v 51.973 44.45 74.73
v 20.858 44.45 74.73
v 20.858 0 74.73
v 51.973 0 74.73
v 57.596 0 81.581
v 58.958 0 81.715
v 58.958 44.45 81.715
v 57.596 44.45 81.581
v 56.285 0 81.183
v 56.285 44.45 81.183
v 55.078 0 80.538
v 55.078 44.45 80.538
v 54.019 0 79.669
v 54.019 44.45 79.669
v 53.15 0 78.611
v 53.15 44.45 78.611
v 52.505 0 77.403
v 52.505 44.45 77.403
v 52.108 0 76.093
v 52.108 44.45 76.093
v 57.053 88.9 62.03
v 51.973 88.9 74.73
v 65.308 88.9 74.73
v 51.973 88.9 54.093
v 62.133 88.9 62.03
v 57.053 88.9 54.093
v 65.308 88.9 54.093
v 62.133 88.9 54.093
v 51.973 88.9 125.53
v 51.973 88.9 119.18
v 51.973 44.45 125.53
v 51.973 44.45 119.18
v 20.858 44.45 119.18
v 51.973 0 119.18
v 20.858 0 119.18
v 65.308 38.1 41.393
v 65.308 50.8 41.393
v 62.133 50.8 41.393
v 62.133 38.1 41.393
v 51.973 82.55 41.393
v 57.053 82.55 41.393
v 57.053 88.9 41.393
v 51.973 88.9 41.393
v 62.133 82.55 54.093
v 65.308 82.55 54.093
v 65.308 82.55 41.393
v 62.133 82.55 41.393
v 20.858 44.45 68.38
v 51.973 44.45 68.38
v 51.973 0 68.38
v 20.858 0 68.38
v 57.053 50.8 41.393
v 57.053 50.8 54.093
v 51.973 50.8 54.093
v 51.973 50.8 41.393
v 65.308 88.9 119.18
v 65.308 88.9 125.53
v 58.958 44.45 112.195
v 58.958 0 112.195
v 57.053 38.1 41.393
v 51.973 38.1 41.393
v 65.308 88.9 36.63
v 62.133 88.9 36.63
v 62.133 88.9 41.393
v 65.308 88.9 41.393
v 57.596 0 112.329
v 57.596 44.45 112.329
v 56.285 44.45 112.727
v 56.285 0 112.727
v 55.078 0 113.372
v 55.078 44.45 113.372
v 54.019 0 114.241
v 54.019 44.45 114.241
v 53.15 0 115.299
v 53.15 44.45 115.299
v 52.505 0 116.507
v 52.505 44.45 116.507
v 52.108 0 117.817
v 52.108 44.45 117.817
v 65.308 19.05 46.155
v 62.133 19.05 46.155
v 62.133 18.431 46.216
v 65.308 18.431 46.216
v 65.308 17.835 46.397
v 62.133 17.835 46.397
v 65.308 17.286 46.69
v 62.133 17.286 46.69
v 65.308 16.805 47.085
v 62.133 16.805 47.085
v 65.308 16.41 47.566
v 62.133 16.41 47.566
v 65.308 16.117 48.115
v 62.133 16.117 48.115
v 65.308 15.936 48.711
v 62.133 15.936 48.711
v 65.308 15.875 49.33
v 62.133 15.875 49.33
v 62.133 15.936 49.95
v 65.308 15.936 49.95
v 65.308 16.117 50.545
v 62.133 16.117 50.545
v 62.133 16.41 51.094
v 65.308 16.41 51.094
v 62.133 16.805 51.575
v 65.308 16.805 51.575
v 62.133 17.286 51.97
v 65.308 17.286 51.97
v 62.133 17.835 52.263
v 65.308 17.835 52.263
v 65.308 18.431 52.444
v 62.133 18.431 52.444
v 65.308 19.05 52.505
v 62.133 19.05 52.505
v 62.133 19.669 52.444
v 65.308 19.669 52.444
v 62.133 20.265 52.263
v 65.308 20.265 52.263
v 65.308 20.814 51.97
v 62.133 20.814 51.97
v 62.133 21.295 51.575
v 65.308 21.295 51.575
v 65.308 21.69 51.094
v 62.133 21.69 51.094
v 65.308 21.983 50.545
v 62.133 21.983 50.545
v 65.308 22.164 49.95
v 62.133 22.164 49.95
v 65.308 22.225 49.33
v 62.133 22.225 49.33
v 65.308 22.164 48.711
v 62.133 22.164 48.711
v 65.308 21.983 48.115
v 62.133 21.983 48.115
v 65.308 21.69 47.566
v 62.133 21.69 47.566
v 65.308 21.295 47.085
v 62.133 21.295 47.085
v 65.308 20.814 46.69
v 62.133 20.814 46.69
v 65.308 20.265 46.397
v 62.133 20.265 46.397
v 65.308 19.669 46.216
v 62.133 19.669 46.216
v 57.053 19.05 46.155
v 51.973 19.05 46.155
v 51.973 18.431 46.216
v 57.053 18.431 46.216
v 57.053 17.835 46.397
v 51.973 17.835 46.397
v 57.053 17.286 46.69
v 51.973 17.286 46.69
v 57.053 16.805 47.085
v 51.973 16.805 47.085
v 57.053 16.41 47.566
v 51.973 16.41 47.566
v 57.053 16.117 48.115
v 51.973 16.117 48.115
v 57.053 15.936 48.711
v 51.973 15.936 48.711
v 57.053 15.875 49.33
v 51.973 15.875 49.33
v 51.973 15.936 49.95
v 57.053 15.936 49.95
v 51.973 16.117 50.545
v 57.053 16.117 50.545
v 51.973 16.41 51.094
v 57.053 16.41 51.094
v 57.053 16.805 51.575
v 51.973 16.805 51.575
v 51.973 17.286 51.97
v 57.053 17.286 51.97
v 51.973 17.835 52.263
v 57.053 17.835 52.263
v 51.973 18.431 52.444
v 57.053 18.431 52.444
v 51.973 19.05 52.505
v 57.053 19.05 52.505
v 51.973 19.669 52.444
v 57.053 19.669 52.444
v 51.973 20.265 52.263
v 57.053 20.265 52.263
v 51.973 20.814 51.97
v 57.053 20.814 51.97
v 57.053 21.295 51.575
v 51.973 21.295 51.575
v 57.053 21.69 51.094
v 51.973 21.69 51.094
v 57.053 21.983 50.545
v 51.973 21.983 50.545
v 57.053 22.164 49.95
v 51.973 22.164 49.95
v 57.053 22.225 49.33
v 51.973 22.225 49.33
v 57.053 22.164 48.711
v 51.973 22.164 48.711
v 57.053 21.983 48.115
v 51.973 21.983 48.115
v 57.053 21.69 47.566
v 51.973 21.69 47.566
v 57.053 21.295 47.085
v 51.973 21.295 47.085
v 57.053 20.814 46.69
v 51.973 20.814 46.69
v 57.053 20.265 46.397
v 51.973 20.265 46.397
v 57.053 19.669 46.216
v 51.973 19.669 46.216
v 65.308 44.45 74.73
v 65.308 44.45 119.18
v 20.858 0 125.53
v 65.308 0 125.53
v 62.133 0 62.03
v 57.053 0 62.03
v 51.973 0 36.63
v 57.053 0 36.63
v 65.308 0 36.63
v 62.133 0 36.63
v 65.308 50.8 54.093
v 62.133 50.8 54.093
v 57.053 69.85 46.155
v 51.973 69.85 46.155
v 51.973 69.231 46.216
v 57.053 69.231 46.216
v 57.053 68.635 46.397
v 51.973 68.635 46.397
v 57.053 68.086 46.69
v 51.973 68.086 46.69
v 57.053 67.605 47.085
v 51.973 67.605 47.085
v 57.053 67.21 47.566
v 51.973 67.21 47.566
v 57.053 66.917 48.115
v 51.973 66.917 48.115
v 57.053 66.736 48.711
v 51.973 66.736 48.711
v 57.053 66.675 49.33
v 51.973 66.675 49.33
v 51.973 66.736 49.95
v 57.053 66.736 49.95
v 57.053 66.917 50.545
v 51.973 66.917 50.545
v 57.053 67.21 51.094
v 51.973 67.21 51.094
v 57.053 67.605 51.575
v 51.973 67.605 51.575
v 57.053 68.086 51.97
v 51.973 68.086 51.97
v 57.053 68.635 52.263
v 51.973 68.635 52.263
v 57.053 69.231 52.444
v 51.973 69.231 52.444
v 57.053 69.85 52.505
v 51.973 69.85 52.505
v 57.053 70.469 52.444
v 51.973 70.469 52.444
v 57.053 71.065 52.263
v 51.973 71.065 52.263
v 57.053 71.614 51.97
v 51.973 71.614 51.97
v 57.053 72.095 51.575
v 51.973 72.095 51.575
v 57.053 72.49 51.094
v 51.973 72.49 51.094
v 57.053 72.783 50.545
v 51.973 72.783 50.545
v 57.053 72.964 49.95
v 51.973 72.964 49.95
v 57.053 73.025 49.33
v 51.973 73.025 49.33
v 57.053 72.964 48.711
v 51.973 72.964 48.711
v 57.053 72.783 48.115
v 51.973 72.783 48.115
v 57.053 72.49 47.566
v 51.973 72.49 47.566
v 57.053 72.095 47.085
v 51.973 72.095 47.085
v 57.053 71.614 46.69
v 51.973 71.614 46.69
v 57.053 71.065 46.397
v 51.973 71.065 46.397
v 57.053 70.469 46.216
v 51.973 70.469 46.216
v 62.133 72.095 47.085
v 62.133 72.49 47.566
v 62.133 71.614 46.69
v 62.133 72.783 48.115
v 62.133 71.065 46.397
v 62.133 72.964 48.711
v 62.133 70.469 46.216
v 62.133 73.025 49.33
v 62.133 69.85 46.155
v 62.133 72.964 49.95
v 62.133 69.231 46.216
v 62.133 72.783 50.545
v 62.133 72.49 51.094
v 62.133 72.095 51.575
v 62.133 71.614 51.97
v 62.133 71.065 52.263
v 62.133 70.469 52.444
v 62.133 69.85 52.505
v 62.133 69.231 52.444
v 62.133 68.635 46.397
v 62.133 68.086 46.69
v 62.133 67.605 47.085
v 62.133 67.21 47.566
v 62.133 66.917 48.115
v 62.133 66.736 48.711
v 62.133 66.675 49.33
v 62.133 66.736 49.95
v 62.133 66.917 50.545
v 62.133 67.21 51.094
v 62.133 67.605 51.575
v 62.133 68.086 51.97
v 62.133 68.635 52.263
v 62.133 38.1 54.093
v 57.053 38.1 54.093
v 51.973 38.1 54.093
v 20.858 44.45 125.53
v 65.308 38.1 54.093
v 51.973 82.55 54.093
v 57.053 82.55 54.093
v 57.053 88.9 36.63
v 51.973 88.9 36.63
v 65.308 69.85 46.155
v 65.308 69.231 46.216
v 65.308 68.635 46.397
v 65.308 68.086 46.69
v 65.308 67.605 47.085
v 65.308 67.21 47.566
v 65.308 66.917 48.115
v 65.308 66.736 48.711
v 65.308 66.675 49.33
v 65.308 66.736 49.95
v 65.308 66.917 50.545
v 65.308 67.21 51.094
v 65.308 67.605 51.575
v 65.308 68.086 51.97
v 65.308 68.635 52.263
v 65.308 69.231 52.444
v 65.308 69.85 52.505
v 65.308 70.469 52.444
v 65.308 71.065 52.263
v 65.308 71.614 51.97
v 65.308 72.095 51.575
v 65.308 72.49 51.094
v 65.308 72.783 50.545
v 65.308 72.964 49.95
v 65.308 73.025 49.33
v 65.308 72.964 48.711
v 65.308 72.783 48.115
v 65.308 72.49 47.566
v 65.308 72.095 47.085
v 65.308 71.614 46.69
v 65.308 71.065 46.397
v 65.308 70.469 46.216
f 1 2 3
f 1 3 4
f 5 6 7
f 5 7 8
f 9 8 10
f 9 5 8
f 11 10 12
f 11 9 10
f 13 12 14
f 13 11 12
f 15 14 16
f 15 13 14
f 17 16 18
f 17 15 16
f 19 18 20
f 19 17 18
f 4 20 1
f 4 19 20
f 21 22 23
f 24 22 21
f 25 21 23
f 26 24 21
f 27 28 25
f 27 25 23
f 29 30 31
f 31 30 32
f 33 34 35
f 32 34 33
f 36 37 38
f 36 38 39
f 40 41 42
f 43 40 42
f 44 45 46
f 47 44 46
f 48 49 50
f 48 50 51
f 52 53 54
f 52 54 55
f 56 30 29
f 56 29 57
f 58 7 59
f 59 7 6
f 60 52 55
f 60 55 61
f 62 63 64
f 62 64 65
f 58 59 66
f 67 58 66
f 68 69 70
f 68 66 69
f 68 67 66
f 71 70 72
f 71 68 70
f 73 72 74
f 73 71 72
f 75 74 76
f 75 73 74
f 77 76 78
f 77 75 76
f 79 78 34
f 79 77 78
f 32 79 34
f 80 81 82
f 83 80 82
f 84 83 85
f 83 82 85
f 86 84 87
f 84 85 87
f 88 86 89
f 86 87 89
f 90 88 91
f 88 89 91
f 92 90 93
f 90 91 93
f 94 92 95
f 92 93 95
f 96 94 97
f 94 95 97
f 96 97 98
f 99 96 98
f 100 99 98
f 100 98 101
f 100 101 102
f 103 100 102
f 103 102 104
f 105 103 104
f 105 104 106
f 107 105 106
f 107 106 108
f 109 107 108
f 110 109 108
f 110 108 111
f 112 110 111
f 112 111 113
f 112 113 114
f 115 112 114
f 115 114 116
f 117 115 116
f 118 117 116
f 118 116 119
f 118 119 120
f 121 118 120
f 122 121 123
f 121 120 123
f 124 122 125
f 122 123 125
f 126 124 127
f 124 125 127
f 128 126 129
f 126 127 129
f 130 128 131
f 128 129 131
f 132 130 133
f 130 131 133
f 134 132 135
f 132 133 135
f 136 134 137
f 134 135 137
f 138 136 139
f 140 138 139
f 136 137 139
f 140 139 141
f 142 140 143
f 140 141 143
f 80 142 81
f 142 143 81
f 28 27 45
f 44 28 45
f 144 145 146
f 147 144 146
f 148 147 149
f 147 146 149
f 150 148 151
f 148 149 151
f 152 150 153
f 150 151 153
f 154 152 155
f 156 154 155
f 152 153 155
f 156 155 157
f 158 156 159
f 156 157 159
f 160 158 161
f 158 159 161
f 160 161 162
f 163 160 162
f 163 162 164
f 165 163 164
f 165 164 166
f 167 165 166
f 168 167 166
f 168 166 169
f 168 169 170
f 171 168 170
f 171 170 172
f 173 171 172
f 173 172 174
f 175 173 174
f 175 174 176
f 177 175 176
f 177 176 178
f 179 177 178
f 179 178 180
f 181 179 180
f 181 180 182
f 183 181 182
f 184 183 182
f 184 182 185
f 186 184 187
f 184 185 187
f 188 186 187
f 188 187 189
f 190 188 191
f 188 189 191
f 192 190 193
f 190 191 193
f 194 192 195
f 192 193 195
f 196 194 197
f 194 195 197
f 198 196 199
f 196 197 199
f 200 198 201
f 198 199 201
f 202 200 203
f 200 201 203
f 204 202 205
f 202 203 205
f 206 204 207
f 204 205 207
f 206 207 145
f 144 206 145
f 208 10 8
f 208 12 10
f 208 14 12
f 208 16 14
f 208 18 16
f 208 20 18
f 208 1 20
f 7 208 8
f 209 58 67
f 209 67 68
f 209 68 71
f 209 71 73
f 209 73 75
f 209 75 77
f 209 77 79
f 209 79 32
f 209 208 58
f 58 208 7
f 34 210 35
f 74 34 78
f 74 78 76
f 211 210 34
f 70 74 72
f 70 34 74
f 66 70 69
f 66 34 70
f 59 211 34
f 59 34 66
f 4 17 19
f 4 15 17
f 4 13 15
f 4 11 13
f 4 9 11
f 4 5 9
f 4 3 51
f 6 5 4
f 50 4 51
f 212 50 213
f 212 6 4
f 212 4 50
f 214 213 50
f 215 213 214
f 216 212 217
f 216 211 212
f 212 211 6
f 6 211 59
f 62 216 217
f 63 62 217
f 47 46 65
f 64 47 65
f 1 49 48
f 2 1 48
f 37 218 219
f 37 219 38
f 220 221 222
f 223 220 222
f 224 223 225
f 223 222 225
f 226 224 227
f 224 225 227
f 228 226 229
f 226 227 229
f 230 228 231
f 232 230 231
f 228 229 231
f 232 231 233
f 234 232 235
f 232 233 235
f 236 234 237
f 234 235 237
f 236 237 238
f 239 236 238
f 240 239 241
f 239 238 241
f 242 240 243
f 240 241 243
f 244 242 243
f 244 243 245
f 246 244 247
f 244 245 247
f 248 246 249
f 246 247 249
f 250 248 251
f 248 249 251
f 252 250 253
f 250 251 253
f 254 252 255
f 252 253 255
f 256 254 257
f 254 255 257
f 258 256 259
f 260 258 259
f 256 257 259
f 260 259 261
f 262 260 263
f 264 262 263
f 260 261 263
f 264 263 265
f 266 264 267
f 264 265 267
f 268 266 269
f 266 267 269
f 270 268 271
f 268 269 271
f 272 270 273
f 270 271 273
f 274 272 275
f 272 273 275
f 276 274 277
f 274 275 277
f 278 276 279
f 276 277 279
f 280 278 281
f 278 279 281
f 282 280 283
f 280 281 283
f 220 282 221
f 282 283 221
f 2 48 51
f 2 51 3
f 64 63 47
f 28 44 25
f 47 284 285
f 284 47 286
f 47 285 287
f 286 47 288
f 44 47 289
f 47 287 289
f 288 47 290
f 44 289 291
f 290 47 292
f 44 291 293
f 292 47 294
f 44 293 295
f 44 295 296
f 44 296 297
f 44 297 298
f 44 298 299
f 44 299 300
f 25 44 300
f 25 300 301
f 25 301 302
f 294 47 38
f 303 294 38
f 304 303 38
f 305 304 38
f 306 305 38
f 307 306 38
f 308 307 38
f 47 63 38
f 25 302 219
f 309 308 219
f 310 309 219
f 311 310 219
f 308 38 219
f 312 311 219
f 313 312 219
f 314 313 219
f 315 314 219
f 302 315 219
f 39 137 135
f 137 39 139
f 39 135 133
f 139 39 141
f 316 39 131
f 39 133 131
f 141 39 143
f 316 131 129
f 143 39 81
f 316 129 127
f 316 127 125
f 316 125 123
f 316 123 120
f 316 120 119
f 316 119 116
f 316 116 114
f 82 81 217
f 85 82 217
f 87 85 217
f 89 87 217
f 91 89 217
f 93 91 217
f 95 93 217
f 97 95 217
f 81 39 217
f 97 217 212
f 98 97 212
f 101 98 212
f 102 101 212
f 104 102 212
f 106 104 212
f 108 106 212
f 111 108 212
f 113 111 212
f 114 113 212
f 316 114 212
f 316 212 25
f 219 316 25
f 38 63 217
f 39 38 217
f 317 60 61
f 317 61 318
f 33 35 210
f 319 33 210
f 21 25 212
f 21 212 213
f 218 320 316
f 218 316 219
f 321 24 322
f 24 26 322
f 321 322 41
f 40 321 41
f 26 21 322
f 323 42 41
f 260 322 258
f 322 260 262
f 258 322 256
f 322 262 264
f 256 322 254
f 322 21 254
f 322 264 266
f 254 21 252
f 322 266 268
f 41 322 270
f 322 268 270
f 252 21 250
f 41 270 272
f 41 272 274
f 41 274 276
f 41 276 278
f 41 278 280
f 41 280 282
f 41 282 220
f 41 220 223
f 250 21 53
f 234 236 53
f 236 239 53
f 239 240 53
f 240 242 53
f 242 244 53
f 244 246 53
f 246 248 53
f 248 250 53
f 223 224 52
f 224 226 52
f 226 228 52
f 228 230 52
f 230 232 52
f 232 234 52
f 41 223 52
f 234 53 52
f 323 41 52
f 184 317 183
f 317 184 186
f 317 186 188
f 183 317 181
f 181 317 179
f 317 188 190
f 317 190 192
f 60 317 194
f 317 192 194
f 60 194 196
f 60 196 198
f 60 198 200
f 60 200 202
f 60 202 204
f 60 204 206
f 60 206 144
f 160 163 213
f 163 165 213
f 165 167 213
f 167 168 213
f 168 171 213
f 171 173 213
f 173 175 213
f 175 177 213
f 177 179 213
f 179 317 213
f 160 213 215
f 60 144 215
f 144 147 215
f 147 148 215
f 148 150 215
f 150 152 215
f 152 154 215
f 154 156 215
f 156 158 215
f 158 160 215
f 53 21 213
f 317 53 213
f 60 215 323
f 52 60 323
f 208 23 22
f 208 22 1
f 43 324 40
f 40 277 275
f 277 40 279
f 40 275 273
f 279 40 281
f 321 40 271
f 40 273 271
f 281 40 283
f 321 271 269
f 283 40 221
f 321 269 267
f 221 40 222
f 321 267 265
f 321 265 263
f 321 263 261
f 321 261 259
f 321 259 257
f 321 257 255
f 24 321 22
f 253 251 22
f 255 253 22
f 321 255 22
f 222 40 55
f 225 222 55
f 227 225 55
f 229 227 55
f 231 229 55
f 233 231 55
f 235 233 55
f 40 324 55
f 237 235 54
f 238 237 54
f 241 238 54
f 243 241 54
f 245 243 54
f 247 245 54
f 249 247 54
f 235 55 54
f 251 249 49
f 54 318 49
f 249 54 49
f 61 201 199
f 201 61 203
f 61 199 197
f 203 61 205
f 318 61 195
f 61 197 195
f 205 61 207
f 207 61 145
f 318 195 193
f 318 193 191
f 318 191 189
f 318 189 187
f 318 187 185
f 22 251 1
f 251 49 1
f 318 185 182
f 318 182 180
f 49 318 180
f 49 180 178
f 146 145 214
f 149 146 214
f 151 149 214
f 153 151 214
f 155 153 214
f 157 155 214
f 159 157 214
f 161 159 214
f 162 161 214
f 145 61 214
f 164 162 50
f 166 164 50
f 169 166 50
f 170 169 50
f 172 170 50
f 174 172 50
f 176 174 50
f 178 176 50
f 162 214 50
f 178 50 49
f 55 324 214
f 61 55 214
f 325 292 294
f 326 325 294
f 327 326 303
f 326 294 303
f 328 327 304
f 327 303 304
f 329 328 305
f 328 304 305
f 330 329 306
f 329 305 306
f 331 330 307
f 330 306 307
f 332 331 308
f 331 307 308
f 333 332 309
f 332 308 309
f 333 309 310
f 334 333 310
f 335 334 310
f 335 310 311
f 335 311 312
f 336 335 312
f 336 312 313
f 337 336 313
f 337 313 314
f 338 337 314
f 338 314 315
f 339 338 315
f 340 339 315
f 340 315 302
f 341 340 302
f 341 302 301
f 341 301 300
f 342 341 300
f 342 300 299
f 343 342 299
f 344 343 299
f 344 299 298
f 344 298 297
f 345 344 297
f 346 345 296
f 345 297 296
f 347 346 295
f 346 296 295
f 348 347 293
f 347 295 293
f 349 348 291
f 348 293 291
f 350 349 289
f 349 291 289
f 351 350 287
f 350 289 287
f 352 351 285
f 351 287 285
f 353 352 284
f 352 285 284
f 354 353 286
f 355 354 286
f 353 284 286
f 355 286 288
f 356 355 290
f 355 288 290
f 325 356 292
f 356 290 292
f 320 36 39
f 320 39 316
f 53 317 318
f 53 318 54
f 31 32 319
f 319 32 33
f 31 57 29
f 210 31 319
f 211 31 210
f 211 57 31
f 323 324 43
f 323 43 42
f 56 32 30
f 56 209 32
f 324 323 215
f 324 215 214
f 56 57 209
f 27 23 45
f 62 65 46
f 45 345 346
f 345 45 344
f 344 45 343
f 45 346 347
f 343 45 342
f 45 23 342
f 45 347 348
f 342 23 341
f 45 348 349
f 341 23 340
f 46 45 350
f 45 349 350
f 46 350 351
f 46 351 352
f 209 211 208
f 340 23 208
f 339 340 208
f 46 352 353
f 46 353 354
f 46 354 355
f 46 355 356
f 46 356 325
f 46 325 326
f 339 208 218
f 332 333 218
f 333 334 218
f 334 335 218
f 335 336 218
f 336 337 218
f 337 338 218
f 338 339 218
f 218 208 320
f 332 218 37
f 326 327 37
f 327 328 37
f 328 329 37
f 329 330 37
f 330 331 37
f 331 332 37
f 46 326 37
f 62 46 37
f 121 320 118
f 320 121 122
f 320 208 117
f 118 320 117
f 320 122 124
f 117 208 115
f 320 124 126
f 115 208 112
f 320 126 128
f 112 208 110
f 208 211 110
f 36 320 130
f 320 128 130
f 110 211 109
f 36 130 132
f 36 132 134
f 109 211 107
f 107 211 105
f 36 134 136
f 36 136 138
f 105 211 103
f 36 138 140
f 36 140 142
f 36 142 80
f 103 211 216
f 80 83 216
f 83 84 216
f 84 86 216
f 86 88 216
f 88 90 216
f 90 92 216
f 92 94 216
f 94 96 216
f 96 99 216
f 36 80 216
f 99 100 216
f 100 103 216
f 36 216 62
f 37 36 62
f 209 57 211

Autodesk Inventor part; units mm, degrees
ref_plane "YZ Plane" through (0, 0, 0) normal (1, 0, 0) x (0, 1, 0)
ref_plane "XZ Plane" through (0, 0, 0) normal (0, 1, 0) x (-1, 0, 0)
ref_plane "XY Plane" through (0, 0, 0) normal (0, 0, 1) x (1, 0, 0)
sketch "Sketch1" plane through (0, 0, 0) normal (0, 1, 0) x (-1, 0, 0)
  line L0 (-51.9733, 36.6301) -> (-51.9733, 68.3801)
  line L1 (-65.3083, 74.7301) -> (-65.3083, 36.6301)
  line L2 (-65.3083, 36.6301) -> (-62.1333, 36.6301)
  line L3 (-62.1333, 36.6301) -> (-62.1333, 62.0301)
  line L4 (-62.1333, 62.0301) -> (-57.0533, 62.0301)
  line L5 (-57.0533, 62.0301) -> (-57.0533, 36.6301)
  line L6 (-57.0533, 36.6301) -> (-51.9733, 36.6301)
  line L7 (-51.9733, 68.3801) -> (-20.8583, 68.3801)
  line L8 (-20.8583, 68.3801) -> (-20.8583, 74.7301)
  line L9 (-20.8583, 74.7301) -> (-65.3083, 74.7301)
  dimension "d2" = 5.08
  dimension "d4" = 25.4
  dimension "d18" = 6.35
  dimension "d19" = 38.1
  dimension "d20" = 3.175
  dimension "d79" = 5.08
  dimension "d80" = 44.45
extrude "Extrusion1" add sketch "Sketch1" along normal blind 177.8
ref_plane "Work Plane2" through (65.3083, -38.1, 36.6301) normal (1, 0, 0) x (0, 0, -1)
sketch "Sketch13" plane through (20.8583, 0, 74.7301) normal (0, 0, 1) x (1, 0, 0)
  line L0 (38.1, 0) -> (44.45, 0)
  line L1 (44.45, 0) -> (44.45, 177.8)
  line L2 (44.45, 177.8) -> (38.1, 177.8)
  line L3 (38.1, 177.8) -> (38.1, 0)
  line L4 (44.45, 0) -> (44.45, 177.8) projected
  line L5 (0, 177.8) -> (44.45, 177.8) projected
  line L6 (0, 0) -> (44.45, 0) projected
  point P0 (-20.8583, 0)
  point P1 (36.195, 177.8)
  point P2 (41.275, 177.8)
  point P3 (36.195, 0)
  point P4 (41.275, 0)
  point P5 (31.115, 0)
  dimension "d81" = 6.35
extrude "Extrusion2" add sketch "Sketch13" along normal blind 50.8
sketch "Sketch21" plane through (58.9583, 0, 74.7301) normal (-1, 0, 0) x (0, 0, 1)
  line L0 (50.8, 177.8) -> (50.8, 0) projected
  line L1 (50.8, 0) -> (44.45, 0)
  line L2 (44.45, 0) -> (44.45, 177.8)
  line L3 (44.45, 177.8) -> (50.8, 177.8)
  line L4 (50.8, 177.8) -> (50.8, 0)
  line L5 (0, 177.8) -> (50.8, 177.8) projected
  point P0 (-74.7301, 0)
  dimension "d91" = 6.35
extrude "Extrusion10" add sketch "Sketch21" along normal blind 38.1
sketch "Sketch22" plane through (51.9733, 0, 68.3801) normal (0, 0, -1) x (-1, 0, 0)
  line L0 (31.115, 0) -> (31.115, 177.8) projected
  line L1 (0, 44.45) -> (31.115, 44.45)
  line L2 (31.115, 44.45) -> (31.115, 133.35)
  line L3 (31.115, 133.35) -> (0, 133.35)
  line L4 (0, 133.35) -> (0, 44.45)
  line L5 (0, 0) -> (31.115, 0) projected
  line L6 (0, 177.8) -> (31.115, 177.8) projected
  line L7 (0, 0) -> (0, 177.8) projected
  point P0 (51.9733, 0)
  dimension "d94" = 44.45
  dimension "d95" = 44.45
extrude "Extrusion11" cut sketch "Sketch22" against normal blind 76.2 contours L1 L4 L3 L0
sketch "Sketch23" plane through (20.8583, 0, 74.7301) normal (0, 0, 1) x (1, 0, 0)
  line L0 (0, 177.8) -> (38.1, 177.8) projected
  line L1 (38.1, 177.8) -> (31.115, 177.8)
  line L2 (31.115, 177.8) -> (31.115, 0)
  line L3 (31.115, 0) -> (38.1, 0)
  line L4 (38.1, 0) -> (38.1, 177.8)
  line L5 (31.115, 133.35) -> (31.115, 44.45) projected
  line L6 (38.1, 0) -> (38.1, 177.8) projected
  line L7 (0, 0) -> (38.1, 0) projected
  point P0 (-20.8583, 0)
revolve "Revolution8" add sketch "Sketch23" angle 90 about axis through (58.9583, 0, 74.7301) along (0, 1, 0)
sketch "Sketch24" plane through (58.9583, 0, 119.1801) normal (0, 0, -1) x (-1, 0, 0)
  line L0 (0, 0) -> (0, 177.8) projected
  line L1 (0, 177.8) -> (38.1, 177.8) projected
  line L2 (0, 0) -> (6.985, 0)
  line L3 (6.985, 0) -> (6.985, 177.8)
  line L4 (6.985, 177.8) -> (0, 177.8)
  line L5 (0, 177.8) -> (0, 0)
  line L6 (6.985, 44.45) -> (6.985, 133.35) projected
  point P0 (58.9583, 0)
revolve "Revolution9" add sketch "Sketch24" angle 90 about axis through (58.9583, 177.8, 119.1801) along (0, -1, 0)
sketch "Sketch25" plane through (65.3083, 0, 36.6301) normal (1, 0, 0) x (0, 0, -1)
  line L0 (-38.1, 44.45) -> (-82.55, 44.45)
  line L1 (-82.55, 44.45) -> (-82.55, 133.35)
  line L2 (-82.55, 133.35) -> (-38.1, 133.35)
  line L3 (-38.1, 133.35) -> (-38.1, 44.45)
  line L4 (-88.9, 0) -> (-88.9, 177.8) projected
  line L5 (-38.1, 133.35) -> (-38.1, 44.45) projected
  line L6 (0, 0) -> (-88.9, 0) projected
  line L7 (0, 177.8) -> (-88.9, 177.8) projected
  line L8 (-82.55, 44.45) -> (-82.55, 0) projected
  point P0 (36.6301, 0)
  dimension "d100" = 44.45
  dimension "d101" = 44.45
extrude "Extrusion12" cut sketch "Sketch25" against normal blind 76.2
sketch "Sketch26" plane through (65.3083, 0, 36.6301) normal (1, 0, 0) x (0, 0, -1)
  line L0 (0, 177.8) -> (0, 0)
  line L1 (0, 88.9) -> (-55.1771, 88.9)
  line L2 (0, 0) -> (0, 177.8) projected
  line L3 (0, 177.8) -> (-88.9, 177.8) projected
  line L4 (0, 0) -> (-88.9, 0) projected
  line L5 (-25.4, 0) -> (-25.4, 177.8) projected
  point P0 (36.6301, 0)
  point P1 (-12.7, 158.75)
  point P2 (-12.7, 107.95)
  point P3 (-12.7, 69.85)
  point P4 (-12.7, 19.05)
  dimension "d104" = 19.05
  dimension "d105" = 19.05
  dimension "d106" = 69.85
  dimension "d107" = 69.85
  dimension "d108" = 12.7
  dimension "d109" = 12.7
  dimension "d110" = 12.7
  dimension "d111" = 12.7
  dimension "d128" = 19.05
  dimension "d129" = 12.7
hole "Hole4" at (65.3083, 19.05, 49.3301) at (65.3083, 69.85, 49.3301) at (65.3083, 107.95, 49.3301) at (65.3083, 158.75, 49.3301) direction (-1, 0, 0) diameter 6.35 end through all
sketch "Sketch27" plane through (65.3083, 0, 36.6301) normal (1, 0, 0) x (0, 0, -1)
  line L0 (0, 0) -> (0, 177.8) projected
  line L1 (0, 88.9) -> (-38.1, 88.9)
  line L2 (-38.1, 133.35) -> (-38.1, 44.45) projected
  line L3 (-17.4625, 88.9) -> (-17.4625, 82.55)
  line L4 (-17.4625, 82.55) -> (-4.7625, 82.55)
  line L5 (-4.7625, 82.55) -> (-4.7625, 88.9)
  line L6 (-17.4625, 50.8) -> (-4.7625, 50.8)
  line L7 (-4.7625, 50.8) -> (-4.7625, 38.1)
  line L8 (-4.7625, 38.1) -> (-17.4625, 38.1)
  line L9 (-17.4625, 38.1) -> (-17.4625, 50.8)
  line L10 (-17.4625, 88.9) -> (-17.4625, 95.25)
  line L11 (-17.4625, 95.25) -> (-4.7625, 95.25)
  line L12 (-4.7625, 95.25) -> (-4.7625, 88.9)
  line L13 (-17.4625, 127) -> (-4.7625, 127)
  line L14 (-4.7625, 127) -> (-4.7625, 139.7)
  line L15 (-4.7625, 139.7) -> (-17.4625, 139.7)
  line L16 (-17.4625, 139.7) -> (-17.4625, 127)
  point P0 (36.6301, 0)
  dimension "d119" = 12.7
  dimension "d120" = 6.35
  dimension "d121" = 31.75
  dimension "d122" = 12.7
  dimension "d123" = 12.7
extrude "Extrusion13" cut sketch "Sketch27" against normal blind 25.4
sketch "Sketch28" plane through (65.3083, 0, 36.6301) normal (1, 0, 0) x (0, 0, -1)
  line L0 (0, 0) -> (0, 177.8) projected
  line L1 (0, 88.9) -> (-88.9, 88.9)
  line L2 (-88.9, 0) -> (-88.9, 177.8) projected
  line L3 (0, 88.9) -> (-88.9, 88.9)
  point P0 (36.6301, 0)
sketch "Sketch29" plane through (0, 177.8, 0) normal (0, 1, 0) x (1, 0, 0)
  line L0 (103.1875, -144.4625) -> (6.35, -144.4625)
  line L1 (6.35, -144.4625) -> (6.35, -22.225)
  line L2 (6.35, -22.225) -> (103.1875, -22.225)
  line L3 (103.1875, -22.225) -> (103.1875, -144.4625)
  point P0 (0, 0)
extrude "Extrusion14" cut sketch "Sketch29" against normal blind 88.9
properties part number "Suspension mount 2.0 split" material "Acetal Resin, Black"
